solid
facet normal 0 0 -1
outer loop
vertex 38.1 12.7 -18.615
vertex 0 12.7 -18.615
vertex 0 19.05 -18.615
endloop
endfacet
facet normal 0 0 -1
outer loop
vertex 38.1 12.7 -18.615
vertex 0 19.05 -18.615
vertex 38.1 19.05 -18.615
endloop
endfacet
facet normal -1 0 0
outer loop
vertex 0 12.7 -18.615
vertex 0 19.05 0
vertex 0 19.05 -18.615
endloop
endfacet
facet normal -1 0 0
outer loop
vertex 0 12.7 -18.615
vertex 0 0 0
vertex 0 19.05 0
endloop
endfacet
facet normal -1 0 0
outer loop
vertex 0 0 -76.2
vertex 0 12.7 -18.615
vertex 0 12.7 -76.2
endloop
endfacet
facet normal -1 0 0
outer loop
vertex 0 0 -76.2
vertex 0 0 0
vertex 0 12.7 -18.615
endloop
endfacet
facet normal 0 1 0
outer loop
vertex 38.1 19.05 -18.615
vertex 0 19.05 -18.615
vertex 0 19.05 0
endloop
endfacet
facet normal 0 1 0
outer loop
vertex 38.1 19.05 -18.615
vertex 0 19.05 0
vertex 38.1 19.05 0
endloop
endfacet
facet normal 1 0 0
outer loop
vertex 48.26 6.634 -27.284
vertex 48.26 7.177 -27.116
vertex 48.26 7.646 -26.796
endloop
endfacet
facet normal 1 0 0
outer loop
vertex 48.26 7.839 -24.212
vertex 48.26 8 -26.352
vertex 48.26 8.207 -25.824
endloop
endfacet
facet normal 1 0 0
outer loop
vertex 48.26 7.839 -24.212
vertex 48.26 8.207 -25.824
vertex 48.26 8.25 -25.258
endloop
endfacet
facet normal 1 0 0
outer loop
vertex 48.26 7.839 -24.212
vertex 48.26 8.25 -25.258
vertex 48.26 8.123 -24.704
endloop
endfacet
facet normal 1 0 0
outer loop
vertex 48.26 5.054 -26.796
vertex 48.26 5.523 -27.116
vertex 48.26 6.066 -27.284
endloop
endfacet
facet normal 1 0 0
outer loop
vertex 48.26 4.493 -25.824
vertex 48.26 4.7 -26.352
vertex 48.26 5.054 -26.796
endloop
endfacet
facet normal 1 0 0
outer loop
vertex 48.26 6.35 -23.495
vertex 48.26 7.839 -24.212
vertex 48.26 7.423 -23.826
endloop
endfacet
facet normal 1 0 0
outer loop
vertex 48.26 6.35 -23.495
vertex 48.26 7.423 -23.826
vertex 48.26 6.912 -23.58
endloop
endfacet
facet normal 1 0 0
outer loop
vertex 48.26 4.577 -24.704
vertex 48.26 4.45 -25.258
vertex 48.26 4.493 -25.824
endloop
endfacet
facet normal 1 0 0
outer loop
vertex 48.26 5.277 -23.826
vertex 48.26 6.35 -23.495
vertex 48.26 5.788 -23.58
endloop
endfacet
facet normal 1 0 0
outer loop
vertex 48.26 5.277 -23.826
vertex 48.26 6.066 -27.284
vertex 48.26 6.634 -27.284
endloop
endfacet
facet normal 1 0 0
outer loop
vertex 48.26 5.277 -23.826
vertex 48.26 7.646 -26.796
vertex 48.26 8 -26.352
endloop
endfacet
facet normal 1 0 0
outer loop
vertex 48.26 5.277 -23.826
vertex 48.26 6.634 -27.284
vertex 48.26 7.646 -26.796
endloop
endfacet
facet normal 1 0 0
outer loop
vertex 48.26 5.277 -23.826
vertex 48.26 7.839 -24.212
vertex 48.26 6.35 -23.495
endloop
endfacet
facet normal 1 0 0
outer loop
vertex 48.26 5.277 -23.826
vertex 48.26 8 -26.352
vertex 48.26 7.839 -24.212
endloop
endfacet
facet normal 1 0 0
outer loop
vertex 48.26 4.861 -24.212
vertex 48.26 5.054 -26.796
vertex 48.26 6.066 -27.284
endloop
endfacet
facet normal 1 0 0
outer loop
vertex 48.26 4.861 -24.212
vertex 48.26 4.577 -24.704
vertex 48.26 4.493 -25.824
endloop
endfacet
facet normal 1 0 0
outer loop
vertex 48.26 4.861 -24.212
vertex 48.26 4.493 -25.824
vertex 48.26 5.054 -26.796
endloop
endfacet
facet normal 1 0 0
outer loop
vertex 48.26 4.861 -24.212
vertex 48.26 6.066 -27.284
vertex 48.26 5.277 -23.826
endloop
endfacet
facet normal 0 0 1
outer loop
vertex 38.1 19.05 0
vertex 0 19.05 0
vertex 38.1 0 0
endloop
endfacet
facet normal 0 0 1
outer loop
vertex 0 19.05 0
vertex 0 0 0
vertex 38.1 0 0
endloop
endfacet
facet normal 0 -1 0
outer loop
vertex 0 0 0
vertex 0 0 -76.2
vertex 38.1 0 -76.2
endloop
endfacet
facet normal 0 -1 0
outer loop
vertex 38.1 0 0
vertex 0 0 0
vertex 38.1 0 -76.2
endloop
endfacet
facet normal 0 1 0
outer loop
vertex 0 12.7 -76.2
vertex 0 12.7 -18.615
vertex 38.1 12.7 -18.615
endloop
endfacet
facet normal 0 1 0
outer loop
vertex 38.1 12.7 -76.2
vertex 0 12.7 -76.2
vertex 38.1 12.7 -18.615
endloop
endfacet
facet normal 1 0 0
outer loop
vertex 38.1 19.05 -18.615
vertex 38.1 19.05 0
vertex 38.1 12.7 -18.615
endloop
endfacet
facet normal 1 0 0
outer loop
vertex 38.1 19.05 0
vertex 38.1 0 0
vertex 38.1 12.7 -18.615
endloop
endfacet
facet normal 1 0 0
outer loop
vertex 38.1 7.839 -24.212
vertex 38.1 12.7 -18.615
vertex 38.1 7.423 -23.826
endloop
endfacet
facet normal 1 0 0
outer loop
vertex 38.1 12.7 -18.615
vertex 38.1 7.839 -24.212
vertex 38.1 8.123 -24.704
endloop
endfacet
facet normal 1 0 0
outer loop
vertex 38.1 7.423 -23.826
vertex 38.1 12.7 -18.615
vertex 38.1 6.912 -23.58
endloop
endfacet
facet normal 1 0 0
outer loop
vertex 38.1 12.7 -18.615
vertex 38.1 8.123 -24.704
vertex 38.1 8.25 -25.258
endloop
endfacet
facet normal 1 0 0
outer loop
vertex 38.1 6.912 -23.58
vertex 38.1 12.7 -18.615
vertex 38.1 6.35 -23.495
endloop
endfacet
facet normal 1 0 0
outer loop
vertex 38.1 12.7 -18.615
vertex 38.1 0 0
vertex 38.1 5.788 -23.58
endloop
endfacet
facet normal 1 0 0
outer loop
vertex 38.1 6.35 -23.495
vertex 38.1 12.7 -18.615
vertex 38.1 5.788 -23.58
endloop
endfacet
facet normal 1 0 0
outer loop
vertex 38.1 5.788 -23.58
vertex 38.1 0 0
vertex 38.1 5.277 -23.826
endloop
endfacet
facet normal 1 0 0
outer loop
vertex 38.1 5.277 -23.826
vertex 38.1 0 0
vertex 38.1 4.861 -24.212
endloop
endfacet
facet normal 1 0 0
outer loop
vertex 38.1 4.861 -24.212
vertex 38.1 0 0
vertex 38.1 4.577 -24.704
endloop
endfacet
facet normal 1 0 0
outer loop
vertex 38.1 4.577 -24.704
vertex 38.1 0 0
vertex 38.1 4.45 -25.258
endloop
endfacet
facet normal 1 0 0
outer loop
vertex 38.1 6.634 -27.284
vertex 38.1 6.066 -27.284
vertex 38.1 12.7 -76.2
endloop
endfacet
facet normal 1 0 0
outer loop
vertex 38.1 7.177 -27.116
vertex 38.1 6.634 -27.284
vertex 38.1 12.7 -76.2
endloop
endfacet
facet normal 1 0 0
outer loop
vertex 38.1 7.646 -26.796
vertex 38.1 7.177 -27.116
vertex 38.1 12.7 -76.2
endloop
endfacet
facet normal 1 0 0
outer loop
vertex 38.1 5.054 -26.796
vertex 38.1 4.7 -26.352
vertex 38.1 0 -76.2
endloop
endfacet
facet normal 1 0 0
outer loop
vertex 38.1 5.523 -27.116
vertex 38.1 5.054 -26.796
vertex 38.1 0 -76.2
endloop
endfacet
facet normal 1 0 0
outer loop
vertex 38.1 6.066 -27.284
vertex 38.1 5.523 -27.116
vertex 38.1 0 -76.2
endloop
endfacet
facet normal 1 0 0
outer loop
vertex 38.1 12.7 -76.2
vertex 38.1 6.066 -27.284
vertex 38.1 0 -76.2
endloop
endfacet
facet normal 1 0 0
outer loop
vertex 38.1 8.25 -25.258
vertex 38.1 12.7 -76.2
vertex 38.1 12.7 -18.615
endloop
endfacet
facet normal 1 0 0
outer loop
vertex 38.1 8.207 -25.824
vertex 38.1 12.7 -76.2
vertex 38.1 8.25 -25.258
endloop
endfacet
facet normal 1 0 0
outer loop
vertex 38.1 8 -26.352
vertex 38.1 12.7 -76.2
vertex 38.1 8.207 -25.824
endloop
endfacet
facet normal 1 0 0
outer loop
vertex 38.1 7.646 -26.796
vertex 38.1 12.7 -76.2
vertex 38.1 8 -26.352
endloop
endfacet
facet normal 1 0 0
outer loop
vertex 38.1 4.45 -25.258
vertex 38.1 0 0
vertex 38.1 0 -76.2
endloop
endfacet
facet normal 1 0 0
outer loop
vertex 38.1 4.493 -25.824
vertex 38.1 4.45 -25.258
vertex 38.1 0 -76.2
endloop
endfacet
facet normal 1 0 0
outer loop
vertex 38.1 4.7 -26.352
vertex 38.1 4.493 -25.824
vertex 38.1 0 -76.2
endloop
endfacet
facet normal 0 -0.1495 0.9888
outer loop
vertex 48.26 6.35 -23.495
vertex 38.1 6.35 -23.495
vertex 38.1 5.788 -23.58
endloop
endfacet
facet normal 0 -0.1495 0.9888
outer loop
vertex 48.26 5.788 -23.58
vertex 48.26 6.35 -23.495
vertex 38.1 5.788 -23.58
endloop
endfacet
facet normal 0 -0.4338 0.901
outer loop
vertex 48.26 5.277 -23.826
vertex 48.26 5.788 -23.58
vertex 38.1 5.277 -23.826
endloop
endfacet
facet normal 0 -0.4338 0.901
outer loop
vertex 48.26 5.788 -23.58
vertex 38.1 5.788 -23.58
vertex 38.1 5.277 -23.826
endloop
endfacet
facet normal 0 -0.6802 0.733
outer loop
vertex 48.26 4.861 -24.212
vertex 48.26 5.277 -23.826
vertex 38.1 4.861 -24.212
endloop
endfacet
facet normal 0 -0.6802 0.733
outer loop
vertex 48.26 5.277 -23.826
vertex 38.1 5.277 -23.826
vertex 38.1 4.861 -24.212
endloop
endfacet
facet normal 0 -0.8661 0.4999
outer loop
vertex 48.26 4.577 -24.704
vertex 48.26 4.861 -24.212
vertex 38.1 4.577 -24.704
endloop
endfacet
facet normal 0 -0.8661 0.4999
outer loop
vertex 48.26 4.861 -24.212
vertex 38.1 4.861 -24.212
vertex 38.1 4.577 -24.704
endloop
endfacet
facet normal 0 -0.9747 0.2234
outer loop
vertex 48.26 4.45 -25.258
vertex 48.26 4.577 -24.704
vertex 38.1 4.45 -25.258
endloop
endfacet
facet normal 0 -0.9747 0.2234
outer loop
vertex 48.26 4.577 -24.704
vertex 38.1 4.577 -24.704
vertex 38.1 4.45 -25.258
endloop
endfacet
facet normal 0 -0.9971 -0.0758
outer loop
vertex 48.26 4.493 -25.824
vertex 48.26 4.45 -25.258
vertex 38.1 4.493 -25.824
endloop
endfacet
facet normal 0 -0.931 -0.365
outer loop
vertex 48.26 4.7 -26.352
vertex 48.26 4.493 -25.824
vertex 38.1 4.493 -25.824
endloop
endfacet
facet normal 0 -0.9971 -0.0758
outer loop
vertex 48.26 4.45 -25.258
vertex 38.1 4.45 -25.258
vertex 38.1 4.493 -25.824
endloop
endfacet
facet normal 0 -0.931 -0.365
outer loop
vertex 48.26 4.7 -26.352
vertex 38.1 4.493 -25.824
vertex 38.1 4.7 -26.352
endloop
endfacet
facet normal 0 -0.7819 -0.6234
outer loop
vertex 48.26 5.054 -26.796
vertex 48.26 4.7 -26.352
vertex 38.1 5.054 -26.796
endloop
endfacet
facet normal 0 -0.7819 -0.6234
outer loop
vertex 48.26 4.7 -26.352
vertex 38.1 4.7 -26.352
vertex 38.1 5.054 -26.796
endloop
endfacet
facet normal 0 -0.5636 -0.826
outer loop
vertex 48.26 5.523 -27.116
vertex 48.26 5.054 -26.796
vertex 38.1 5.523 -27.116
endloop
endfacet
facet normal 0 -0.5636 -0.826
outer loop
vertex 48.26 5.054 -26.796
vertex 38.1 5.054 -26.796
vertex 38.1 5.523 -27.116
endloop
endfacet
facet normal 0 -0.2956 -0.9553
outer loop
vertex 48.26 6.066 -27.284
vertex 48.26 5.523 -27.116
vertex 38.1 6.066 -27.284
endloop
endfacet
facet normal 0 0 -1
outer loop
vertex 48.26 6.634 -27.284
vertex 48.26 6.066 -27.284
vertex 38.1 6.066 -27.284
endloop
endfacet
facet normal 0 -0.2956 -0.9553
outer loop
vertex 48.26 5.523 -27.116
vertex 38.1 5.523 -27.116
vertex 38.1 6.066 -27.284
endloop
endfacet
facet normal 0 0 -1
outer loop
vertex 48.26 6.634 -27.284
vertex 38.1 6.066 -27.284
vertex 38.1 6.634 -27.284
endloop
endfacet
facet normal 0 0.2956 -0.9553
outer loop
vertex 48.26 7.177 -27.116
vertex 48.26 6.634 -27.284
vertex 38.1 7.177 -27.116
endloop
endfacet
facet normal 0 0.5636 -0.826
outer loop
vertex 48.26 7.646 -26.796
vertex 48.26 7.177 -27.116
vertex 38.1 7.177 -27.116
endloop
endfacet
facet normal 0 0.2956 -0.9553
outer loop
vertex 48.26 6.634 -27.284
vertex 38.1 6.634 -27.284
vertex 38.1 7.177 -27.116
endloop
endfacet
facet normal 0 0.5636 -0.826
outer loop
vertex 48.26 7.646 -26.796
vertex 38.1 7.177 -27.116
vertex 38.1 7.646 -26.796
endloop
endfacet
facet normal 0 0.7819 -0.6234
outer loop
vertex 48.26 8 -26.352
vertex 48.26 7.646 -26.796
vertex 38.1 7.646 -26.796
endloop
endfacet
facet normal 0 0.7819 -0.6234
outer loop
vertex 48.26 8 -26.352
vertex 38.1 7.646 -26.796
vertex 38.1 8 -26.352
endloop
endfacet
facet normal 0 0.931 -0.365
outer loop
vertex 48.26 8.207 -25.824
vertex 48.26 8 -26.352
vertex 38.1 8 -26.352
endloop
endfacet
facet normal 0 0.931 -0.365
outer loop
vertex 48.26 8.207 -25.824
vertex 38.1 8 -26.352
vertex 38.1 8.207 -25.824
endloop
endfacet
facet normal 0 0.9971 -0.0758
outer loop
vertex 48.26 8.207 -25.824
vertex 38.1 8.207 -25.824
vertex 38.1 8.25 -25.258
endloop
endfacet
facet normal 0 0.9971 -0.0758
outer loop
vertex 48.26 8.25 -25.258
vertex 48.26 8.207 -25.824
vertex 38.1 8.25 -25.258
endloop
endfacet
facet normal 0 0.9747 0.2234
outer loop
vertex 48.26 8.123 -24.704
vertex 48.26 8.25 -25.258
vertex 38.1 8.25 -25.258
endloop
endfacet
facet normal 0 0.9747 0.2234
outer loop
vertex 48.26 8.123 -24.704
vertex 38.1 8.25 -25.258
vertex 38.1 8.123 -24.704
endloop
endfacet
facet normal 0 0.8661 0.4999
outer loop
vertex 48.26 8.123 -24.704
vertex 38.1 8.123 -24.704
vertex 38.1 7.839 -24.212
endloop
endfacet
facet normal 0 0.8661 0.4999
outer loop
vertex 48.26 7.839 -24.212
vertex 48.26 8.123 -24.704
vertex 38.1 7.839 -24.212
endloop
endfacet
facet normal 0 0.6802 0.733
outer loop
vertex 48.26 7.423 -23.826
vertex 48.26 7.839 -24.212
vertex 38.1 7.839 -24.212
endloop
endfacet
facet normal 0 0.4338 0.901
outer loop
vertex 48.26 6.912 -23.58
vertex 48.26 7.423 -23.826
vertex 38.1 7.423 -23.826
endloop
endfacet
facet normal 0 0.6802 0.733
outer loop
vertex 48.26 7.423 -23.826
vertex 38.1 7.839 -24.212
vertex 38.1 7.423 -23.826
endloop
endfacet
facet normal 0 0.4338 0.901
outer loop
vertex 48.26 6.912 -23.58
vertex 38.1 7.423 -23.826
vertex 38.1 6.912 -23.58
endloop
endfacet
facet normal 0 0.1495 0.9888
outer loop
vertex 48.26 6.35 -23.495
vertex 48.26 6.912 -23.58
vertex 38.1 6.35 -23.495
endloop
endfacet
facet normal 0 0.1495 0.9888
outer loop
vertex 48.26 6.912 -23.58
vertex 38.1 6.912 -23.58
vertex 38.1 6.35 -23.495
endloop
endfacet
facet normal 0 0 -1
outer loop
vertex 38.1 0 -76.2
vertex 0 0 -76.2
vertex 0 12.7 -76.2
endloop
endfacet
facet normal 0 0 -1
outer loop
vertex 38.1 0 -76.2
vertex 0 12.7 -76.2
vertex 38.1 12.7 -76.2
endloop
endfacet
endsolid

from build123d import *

# Parameters (mm, degrees)
SKETCH2_W           = 38.1
SKETCH2_H           = 76.2
BOSS_EXTRUDE1_DEPTH = 12.7
SKETCH5_W           = 38.1
SKETCH5_H           = 18.614666354
BOSS_EXTRUDE5_DEPTH = 2.54
SKETCH4_R           = 1.905
BOSS_EXTRUDE6_DEPTH = 10.16
SKETCH7_W           = 38.1
SKETCH7_H           = 18.614666354
BOSS_EXTRUDE7_DEPTH = 3.81


with BuildPart() as part:
    # Sketch2 → Boss-Extrude1 (new body)
    with BuildSketch(Plane(origin=(0, 0, 0), x_dir=(1, 0, 0), z_dir=(0, 1, 0))):
        with Locations((19.05, 38.1)):
            Rectangle(SKETCH2_W, SKETCH2_H)
    extrude(amount=BOSS_EXTRUDE1_DEPTH)

    # Sketch5 → Boss-Extrude5 (add)
    with BuildSketch(Plane(origin=(0, 12.7, 0), x_dir=(1, 0, 0), z_dir=(0, 1, 0))):
        with Locations((19.05, 9.307333177)):
            Rectangle(SKETCH5_W, SKETCH5_H)
    extrude(amount=BOSS_EXTRUDE5_DEPTH)

    # Sketch4 → Boss-Extrude6 (add)
    with BuildSketch(Plane(origin=(38.1, 0, 0), x_dir=(0, 0, -1), z_dir=(1, 0, 0))):
        with Locations(Location((25.4, 6.35, 0), (0, 0, 180))):
            Circle(SKETCH4_R)
    extrude(amount=BOSS_EXTRUDE6_DEPTH)

    # Sketch7 → Boss-Extrude7 (add)
    with BuildSketch(Plane(origin=(0, 15.24, 0), x_dir=(1, 0, 0), z_dir=(0, 1, 0))):
        with Locations((19.05, 9.307333177)):
            Rectangle(SKETCH7_W, SKETCH7_H)
    extrude(amount=BOSS_EXTRUDE7_DEPTH)


solid = part.part
